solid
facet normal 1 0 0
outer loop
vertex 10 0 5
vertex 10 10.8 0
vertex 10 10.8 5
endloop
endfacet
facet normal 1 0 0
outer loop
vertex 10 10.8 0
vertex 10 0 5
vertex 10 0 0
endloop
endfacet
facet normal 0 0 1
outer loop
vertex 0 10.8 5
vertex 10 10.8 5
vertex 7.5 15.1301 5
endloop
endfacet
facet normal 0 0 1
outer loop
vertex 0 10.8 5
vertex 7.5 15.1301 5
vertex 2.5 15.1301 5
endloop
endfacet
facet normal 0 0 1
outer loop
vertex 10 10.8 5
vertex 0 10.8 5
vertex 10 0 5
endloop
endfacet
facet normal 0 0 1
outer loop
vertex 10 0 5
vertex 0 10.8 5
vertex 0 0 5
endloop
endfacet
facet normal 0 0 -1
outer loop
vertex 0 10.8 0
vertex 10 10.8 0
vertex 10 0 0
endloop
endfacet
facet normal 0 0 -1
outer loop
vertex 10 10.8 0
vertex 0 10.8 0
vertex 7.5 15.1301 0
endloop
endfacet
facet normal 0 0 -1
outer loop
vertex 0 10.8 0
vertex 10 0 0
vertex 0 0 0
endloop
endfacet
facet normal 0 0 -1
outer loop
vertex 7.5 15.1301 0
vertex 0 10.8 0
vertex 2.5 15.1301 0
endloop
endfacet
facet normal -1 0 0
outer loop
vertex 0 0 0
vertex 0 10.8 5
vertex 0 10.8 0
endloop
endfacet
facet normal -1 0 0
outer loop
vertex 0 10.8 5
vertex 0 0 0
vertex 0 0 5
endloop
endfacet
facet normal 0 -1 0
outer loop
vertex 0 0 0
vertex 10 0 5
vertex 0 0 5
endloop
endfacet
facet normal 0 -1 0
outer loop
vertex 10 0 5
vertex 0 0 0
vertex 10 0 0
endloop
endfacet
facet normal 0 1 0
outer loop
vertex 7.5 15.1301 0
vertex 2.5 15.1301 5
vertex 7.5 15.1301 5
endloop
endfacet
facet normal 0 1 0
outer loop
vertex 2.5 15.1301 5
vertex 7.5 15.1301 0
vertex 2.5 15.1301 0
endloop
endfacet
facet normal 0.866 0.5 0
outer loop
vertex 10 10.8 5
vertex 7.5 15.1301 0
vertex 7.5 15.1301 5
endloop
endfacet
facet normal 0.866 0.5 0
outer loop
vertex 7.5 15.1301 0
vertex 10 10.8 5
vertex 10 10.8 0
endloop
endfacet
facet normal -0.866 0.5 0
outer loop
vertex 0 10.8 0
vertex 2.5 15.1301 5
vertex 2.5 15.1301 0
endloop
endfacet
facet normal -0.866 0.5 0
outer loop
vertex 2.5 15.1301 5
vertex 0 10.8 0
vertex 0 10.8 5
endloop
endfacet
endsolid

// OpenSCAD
$fn = 150;

union() {
	cube(size = [10.0, 10.799999999999999, 5]);
	translate(v = [0, 10.799999999999999, 0]) {
		translate(v = [5.0, 0, 0]) {
			cylinder($fn = 6, d = 10.0, h = 5);
		}
	}
}
